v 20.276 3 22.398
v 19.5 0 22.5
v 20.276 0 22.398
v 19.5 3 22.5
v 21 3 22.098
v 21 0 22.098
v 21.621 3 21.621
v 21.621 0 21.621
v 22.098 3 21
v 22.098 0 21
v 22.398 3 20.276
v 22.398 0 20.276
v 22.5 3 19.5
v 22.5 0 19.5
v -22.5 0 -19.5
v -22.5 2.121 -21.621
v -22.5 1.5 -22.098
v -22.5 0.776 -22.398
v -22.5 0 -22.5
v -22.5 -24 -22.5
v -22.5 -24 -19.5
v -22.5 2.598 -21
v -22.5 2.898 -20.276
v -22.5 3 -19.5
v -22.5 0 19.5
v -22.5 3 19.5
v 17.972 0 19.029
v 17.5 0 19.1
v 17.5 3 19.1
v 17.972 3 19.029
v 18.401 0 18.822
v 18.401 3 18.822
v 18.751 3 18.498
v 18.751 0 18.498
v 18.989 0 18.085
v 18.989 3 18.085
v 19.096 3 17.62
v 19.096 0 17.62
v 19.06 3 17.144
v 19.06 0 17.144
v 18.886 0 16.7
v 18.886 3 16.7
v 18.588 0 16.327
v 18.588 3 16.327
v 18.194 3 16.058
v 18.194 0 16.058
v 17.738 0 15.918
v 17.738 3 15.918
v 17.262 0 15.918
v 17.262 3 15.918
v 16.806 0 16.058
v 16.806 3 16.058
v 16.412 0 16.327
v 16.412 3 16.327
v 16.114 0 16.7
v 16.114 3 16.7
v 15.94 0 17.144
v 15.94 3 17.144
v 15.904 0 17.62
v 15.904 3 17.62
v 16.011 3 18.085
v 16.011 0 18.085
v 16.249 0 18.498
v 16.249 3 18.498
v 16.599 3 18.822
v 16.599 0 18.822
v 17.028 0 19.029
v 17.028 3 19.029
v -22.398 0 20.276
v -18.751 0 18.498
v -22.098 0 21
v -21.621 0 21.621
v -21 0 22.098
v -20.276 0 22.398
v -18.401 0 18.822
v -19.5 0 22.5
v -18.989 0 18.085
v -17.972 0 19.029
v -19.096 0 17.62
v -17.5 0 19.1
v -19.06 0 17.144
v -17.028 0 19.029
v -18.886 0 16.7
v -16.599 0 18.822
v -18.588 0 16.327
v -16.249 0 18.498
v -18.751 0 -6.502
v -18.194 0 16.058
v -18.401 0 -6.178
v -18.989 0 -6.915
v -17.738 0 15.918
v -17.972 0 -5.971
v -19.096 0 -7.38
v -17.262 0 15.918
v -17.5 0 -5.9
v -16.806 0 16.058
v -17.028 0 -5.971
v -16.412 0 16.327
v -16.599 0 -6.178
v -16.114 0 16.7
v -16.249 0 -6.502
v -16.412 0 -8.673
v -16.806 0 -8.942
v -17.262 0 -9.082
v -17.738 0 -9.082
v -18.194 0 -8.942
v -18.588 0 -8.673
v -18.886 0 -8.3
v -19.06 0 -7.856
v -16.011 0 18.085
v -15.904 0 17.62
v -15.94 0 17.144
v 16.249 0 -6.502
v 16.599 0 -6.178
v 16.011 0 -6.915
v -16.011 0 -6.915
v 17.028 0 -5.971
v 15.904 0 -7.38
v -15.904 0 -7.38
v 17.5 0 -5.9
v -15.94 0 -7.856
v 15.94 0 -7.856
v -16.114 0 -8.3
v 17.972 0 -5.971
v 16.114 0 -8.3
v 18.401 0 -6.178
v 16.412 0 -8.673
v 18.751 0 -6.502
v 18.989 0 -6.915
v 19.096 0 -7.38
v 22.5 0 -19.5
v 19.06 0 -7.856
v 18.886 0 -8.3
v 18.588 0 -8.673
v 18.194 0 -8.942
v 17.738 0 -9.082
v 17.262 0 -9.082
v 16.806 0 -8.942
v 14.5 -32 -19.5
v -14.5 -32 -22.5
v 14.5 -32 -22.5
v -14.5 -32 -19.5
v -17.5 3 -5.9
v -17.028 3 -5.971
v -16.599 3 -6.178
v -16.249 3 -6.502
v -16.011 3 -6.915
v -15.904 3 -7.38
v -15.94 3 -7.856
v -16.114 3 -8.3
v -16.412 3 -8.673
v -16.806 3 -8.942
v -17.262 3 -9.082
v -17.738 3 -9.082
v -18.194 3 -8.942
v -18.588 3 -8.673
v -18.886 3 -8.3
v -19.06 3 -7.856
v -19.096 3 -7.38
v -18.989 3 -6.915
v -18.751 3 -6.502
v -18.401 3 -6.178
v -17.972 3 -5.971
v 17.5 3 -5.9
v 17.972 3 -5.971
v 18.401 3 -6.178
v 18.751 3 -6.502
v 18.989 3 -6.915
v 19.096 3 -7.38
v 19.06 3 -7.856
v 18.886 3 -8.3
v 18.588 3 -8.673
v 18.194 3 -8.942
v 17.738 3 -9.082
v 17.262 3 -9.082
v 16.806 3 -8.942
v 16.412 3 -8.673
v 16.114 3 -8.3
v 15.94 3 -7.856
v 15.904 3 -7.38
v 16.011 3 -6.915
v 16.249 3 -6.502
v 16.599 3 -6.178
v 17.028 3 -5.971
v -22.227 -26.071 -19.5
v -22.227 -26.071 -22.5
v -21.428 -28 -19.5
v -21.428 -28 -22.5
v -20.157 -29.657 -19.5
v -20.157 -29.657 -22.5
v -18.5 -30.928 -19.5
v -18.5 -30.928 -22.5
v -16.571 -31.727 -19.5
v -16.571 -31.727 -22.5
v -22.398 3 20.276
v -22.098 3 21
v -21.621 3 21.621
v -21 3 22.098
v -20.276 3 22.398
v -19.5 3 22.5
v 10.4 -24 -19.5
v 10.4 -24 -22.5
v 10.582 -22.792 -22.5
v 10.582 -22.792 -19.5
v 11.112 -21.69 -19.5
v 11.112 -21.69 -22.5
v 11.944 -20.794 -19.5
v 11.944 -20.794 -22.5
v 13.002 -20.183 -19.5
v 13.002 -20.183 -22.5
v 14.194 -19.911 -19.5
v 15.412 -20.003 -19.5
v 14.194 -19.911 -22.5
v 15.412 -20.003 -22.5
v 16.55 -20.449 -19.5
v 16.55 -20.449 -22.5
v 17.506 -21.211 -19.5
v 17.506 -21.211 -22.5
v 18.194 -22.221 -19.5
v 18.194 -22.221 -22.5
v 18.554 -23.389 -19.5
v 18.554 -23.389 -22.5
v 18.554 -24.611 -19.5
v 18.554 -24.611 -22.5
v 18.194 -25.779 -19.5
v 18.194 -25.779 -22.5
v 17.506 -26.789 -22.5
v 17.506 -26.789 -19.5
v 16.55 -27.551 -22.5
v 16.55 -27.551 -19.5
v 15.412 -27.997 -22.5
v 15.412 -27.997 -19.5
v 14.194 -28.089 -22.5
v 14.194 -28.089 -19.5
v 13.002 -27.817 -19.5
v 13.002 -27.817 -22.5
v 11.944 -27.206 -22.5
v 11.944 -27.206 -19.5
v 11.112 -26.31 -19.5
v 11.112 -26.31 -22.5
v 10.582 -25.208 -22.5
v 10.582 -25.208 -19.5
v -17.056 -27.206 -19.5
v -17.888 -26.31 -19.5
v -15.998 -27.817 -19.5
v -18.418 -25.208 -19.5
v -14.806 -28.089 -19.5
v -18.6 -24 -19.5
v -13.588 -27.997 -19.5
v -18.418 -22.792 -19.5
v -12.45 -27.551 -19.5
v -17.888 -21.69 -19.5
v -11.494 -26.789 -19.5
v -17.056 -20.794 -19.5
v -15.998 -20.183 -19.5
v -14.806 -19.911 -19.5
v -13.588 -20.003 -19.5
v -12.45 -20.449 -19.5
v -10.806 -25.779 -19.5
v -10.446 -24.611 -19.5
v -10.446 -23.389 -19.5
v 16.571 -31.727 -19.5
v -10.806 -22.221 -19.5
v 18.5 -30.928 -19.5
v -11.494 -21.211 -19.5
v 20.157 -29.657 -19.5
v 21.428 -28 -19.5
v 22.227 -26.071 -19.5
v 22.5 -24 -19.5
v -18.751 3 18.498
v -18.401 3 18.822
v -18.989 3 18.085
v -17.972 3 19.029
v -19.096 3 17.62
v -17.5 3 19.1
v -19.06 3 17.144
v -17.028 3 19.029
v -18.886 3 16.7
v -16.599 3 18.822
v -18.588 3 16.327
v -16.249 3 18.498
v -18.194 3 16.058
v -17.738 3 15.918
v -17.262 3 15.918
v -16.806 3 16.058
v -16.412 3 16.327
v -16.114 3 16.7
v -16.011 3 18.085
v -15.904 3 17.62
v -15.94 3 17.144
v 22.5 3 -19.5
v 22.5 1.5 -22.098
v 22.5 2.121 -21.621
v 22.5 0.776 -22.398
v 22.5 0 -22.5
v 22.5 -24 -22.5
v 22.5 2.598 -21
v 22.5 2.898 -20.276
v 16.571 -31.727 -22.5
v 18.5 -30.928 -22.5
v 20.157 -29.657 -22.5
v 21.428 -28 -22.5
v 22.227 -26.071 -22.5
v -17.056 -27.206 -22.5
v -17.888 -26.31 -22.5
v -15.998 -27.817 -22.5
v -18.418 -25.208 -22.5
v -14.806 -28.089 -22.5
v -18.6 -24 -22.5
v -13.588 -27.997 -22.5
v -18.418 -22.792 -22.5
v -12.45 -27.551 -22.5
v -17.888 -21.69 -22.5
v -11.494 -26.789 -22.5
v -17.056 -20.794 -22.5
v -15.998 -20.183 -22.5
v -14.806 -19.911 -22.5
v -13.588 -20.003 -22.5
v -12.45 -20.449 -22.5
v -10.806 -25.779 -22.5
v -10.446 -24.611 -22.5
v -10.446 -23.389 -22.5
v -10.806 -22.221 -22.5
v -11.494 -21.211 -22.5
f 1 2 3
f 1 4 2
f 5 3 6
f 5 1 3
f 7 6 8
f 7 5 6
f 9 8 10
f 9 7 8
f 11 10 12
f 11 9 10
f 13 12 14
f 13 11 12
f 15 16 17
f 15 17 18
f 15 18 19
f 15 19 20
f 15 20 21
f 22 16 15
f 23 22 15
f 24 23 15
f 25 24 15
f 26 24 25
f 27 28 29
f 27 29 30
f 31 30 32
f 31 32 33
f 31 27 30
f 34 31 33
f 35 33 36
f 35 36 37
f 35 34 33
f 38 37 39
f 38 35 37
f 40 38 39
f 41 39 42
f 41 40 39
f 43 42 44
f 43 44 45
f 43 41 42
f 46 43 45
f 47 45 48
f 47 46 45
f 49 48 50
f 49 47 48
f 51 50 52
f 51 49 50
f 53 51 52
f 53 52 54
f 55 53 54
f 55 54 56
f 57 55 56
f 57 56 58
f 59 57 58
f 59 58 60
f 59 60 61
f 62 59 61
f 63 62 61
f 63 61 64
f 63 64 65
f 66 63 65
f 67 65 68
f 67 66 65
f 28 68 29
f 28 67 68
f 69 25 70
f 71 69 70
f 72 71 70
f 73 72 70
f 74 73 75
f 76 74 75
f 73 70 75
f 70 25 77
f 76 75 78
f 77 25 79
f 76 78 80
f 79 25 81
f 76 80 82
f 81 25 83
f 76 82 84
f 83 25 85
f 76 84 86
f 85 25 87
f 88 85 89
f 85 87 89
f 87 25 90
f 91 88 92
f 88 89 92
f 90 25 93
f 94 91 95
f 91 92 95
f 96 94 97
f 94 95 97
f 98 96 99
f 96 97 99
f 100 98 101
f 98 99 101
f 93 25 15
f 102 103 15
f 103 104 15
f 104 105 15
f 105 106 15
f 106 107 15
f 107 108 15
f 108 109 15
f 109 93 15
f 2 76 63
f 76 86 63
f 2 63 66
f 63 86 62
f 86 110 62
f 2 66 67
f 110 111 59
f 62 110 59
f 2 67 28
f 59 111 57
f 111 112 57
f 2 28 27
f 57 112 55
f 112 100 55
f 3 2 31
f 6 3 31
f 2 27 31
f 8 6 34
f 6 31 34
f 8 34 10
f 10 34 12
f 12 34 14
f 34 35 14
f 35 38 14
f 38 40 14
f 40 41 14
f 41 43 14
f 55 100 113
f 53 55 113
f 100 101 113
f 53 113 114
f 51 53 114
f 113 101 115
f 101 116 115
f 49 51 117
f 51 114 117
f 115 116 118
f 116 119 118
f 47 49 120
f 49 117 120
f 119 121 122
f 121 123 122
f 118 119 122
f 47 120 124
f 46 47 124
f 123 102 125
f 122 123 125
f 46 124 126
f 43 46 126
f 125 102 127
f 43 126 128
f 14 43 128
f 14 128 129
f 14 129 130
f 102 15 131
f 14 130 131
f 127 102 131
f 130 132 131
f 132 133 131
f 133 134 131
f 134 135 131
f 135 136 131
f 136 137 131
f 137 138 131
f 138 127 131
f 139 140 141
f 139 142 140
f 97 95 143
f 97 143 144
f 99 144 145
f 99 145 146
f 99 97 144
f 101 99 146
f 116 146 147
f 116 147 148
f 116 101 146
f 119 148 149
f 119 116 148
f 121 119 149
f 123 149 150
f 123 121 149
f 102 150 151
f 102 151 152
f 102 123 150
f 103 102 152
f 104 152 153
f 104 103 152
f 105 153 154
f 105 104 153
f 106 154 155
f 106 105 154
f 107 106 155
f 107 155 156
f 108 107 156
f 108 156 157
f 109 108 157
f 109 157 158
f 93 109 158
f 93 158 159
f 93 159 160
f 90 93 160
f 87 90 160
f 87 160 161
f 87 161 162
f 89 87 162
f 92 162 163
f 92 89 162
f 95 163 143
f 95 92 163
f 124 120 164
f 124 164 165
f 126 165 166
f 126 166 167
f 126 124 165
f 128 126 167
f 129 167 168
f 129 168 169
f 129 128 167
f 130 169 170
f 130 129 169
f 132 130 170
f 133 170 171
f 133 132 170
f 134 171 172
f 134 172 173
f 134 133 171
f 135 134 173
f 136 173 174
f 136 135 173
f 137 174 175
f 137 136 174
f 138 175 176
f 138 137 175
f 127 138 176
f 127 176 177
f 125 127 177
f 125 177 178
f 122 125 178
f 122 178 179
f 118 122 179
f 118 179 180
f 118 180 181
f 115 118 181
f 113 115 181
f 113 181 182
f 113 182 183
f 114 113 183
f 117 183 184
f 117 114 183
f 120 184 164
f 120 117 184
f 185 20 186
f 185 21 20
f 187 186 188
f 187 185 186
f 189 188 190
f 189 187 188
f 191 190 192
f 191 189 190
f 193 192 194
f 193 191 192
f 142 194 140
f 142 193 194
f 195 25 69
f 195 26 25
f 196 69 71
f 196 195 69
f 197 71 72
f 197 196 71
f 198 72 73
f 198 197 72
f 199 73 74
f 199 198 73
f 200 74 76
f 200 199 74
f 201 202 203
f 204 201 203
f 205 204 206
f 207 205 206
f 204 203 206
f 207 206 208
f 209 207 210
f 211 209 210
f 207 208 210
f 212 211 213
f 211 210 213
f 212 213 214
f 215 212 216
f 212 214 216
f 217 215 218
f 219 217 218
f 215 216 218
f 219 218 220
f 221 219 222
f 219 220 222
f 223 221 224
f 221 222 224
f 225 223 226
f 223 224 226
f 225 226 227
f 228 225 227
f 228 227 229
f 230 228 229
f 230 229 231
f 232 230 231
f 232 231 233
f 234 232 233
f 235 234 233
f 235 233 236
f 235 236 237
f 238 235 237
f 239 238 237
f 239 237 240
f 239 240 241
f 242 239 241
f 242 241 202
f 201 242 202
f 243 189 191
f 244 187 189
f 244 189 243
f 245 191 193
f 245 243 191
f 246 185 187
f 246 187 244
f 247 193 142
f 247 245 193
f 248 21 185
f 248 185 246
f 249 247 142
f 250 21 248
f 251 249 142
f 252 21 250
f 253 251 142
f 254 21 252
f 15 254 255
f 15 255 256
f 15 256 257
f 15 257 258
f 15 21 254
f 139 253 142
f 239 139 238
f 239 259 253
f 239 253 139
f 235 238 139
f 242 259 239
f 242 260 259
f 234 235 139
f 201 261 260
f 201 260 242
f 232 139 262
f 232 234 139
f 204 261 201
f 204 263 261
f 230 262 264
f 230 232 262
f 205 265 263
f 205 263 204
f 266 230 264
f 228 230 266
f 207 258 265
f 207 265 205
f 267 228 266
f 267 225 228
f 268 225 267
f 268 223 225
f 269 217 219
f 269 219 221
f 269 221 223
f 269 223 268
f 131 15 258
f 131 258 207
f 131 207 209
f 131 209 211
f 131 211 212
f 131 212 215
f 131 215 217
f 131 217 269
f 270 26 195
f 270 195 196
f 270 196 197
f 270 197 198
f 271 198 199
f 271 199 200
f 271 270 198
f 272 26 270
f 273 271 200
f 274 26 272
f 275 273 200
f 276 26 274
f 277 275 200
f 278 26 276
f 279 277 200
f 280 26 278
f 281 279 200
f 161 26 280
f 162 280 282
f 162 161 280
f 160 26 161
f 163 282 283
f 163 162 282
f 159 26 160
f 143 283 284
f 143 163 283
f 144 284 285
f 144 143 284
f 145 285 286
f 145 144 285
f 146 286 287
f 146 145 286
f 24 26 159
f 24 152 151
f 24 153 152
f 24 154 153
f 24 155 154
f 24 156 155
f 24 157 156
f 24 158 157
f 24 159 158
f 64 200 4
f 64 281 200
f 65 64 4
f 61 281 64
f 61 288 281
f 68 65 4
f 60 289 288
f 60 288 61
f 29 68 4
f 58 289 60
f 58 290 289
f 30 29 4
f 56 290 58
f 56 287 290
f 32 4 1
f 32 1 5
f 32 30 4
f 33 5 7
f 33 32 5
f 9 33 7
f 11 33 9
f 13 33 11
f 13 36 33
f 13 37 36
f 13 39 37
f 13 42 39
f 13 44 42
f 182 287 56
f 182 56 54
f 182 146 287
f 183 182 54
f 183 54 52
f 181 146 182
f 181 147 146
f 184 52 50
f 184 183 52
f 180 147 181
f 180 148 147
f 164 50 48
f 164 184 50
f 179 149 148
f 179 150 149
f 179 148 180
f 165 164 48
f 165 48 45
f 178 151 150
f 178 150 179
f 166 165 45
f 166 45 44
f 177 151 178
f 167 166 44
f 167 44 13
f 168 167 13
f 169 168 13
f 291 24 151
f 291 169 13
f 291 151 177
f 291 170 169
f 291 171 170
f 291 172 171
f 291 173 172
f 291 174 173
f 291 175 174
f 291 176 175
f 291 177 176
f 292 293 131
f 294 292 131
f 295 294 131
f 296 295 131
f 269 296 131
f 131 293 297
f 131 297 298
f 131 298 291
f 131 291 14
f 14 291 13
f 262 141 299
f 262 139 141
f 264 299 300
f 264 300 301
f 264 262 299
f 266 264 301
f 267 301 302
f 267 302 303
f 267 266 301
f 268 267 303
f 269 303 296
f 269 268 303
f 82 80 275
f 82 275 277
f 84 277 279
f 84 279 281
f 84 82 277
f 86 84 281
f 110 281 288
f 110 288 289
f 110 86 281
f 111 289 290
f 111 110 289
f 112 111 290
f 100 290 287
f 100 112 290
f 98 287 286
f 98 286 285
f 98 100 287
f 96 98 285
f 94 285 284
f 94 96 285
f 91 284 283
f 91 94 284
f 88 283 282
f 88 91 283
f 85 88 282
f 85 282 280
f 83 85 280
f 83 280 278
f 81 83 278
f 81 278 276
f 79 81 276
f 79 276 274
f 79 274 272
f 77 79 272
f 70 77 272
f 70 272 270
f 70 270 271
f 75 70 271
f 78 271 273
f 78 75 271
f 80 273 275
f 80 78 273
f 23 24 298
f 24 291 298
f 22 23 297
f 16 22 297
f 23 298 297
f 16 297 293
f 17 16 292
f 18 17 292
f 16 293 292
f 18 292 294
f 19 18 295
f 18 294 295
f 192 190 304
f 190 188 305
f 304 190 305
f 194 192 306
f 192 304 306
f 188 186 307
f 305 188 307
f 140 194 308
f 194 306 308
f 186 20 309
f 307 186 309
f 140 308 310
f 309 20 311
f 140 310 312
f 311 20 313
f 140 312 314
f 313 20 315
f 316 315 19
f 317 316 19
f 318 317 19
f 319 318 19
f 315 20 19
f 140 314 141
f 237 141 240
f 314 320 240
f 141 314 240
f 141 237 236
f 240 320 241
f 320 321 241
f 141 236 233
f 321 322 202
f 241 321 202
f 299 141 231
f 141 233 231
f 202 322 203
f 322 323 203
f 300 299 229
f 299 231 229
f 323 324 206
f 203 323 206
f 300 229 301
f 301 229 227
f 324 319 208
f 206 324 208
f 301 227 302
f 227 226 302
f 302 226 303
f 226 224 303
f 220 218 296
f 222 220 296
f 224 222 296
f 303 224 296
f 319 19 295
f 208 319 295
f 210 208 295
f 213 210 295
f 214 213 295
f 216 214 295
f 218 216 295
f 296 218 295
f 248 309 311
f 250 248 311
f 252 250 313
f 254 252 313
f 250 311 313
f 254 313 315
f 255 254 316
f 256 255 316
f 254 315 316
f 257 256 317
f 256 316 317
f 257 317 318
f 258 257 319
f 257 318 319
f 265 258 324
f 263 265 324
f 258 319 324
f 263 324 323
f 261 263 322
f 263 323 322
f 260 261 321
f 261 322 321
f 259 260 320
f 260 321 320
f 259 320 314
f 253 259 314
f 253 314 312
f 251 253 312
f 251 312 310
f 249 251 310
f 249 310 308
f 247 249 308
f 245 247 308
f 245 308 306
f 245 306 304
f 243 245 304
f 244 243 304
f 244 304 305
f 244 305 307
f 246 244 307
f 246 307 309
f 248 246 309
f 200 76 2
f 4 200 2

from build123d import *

# Parameters (mm, degrees)
SKETCH_1_W          = 45
SKETCH_1_H          = 45
SKETCH_1_R          = 1.6
EXTRUDE_1_DEPTH     = 3
SKETCH_2_W          = 45
SKETCH_2_H          = 3
EXTRUDE_2_DEPTH     = 32
CUT_EXTRUDE_1_REACH = 61.626
SKETCH_3_R          = 4.1
FILLET_1_R          = 3
FILLET_2_R          = 8


with BuildPart() as part:
    # 草图1 → 凸台-拉伸1 (new body)
    with BuildSketch(Plane(origin=(0, 0, 0), x_dir=(1, 0, 0), z_dir=(0, 1, 0))):
        Rectangle(SKETCH_1_W, SKETCH_1_H)
        with Locations(Location((-17.5, -17.5, 0), (0, 0, 270))):
            Circle(SKETCH_1_R, mode=Mode.SUBTRACT)
        with Locations(Location((17.5, -17.5, 0), (0, 0, 270))):
            Circle(SKETCH_1_R, mode=Mode.SUBTRACT)
        with Locations(Location((17.5, 7.5, 0), (0, 0, 270))):
            Circle(SKETCH_1_R, mode=Mode.SUBTRACT)
        with Locations(Location((-17.5, 7.5, 0), (0, 0, 270))):
            Circle(SKETCH_1_R, mode=Mode.SUBTRACT)
    extrude(amount=EXTRUDE_1_DEPTH)

    # 草图2 → 凸台-拉伸2 (add)
    with BuildSketch(Plane.XZ):
        with Locations((0, -21)):
            Rectangle(SKETCH_2_W, SKETCH_2_H)
    extrude(amount=EXTRUDE_2_DEPTH)

    # 草图3 → 切除-拉伸1 (cut, up to next)
    with BuildSketch(Plane(origin=(0, 0, -22.5), x_dir=(-1, 0, 0), z_dir=(0, 0, -1)), mode=Mode.PRIVATE) as cut_extrude_1_sk1:
        with Locations((-14.5, -24)):
            Circle(SKETCH_3_R)
    cut_extrude_1_tool1 = extrude(cut_extrude_1_sk1.sketch, amount=-CUT_EXTRUDE_1_REACH, mode=Mode.PRIVATE) & part.part
    # 草图3 → 切除-拉伸1 (cut, up to next)
    with BuildSketch(Plane(origin=(0, 0, -22.5), x_dir=(-1, 0, 0), z_dir=(0, 0, -1)), mode=Mode.PRIVATE) as cut_extrude_1_sk2:
        with Locations((14.5, -24)):
            Circle(SKETCH_3_R)
    cut_extrude_1_tool2 = extrude(cut_extrude_1_sk2.sketch, amount=-CUT_EXTRUDE_1_REACH, mode=Mode.PRIVATE) & part.part
    add(cut_extrude_1_tool1.solids().sort_by_distance((14.5, -24, -22.5))[0], mode=Mode.SUBTRACT)
    add(cut_extrude_1_tool2.solids().sort_by_distance((-14.5, -24, -22.5))[0], mode=Mode.SUBTRACT)

    # 圆角1
    fillet_1_edges = [part.edges().sort_by_distance(p)[0] for p in [
        (22.5, 1.5, 22.5),
        (-22.5, 1.5, 22.5),
        (0, 3, -22.5),
    ]]
    fillet(fillet_1_edges, radius=FILLET_1_R)

    # 圆角2
    fillet_2_edges = [part.edges().sort_by_distance(p)[0] for p in [
        (22.5, -32, -21),
        (-22.5, -32, -21),
    ]]
    fillet(fillet_2_edges, radius=FILLET_2_R)


solid = part.part
